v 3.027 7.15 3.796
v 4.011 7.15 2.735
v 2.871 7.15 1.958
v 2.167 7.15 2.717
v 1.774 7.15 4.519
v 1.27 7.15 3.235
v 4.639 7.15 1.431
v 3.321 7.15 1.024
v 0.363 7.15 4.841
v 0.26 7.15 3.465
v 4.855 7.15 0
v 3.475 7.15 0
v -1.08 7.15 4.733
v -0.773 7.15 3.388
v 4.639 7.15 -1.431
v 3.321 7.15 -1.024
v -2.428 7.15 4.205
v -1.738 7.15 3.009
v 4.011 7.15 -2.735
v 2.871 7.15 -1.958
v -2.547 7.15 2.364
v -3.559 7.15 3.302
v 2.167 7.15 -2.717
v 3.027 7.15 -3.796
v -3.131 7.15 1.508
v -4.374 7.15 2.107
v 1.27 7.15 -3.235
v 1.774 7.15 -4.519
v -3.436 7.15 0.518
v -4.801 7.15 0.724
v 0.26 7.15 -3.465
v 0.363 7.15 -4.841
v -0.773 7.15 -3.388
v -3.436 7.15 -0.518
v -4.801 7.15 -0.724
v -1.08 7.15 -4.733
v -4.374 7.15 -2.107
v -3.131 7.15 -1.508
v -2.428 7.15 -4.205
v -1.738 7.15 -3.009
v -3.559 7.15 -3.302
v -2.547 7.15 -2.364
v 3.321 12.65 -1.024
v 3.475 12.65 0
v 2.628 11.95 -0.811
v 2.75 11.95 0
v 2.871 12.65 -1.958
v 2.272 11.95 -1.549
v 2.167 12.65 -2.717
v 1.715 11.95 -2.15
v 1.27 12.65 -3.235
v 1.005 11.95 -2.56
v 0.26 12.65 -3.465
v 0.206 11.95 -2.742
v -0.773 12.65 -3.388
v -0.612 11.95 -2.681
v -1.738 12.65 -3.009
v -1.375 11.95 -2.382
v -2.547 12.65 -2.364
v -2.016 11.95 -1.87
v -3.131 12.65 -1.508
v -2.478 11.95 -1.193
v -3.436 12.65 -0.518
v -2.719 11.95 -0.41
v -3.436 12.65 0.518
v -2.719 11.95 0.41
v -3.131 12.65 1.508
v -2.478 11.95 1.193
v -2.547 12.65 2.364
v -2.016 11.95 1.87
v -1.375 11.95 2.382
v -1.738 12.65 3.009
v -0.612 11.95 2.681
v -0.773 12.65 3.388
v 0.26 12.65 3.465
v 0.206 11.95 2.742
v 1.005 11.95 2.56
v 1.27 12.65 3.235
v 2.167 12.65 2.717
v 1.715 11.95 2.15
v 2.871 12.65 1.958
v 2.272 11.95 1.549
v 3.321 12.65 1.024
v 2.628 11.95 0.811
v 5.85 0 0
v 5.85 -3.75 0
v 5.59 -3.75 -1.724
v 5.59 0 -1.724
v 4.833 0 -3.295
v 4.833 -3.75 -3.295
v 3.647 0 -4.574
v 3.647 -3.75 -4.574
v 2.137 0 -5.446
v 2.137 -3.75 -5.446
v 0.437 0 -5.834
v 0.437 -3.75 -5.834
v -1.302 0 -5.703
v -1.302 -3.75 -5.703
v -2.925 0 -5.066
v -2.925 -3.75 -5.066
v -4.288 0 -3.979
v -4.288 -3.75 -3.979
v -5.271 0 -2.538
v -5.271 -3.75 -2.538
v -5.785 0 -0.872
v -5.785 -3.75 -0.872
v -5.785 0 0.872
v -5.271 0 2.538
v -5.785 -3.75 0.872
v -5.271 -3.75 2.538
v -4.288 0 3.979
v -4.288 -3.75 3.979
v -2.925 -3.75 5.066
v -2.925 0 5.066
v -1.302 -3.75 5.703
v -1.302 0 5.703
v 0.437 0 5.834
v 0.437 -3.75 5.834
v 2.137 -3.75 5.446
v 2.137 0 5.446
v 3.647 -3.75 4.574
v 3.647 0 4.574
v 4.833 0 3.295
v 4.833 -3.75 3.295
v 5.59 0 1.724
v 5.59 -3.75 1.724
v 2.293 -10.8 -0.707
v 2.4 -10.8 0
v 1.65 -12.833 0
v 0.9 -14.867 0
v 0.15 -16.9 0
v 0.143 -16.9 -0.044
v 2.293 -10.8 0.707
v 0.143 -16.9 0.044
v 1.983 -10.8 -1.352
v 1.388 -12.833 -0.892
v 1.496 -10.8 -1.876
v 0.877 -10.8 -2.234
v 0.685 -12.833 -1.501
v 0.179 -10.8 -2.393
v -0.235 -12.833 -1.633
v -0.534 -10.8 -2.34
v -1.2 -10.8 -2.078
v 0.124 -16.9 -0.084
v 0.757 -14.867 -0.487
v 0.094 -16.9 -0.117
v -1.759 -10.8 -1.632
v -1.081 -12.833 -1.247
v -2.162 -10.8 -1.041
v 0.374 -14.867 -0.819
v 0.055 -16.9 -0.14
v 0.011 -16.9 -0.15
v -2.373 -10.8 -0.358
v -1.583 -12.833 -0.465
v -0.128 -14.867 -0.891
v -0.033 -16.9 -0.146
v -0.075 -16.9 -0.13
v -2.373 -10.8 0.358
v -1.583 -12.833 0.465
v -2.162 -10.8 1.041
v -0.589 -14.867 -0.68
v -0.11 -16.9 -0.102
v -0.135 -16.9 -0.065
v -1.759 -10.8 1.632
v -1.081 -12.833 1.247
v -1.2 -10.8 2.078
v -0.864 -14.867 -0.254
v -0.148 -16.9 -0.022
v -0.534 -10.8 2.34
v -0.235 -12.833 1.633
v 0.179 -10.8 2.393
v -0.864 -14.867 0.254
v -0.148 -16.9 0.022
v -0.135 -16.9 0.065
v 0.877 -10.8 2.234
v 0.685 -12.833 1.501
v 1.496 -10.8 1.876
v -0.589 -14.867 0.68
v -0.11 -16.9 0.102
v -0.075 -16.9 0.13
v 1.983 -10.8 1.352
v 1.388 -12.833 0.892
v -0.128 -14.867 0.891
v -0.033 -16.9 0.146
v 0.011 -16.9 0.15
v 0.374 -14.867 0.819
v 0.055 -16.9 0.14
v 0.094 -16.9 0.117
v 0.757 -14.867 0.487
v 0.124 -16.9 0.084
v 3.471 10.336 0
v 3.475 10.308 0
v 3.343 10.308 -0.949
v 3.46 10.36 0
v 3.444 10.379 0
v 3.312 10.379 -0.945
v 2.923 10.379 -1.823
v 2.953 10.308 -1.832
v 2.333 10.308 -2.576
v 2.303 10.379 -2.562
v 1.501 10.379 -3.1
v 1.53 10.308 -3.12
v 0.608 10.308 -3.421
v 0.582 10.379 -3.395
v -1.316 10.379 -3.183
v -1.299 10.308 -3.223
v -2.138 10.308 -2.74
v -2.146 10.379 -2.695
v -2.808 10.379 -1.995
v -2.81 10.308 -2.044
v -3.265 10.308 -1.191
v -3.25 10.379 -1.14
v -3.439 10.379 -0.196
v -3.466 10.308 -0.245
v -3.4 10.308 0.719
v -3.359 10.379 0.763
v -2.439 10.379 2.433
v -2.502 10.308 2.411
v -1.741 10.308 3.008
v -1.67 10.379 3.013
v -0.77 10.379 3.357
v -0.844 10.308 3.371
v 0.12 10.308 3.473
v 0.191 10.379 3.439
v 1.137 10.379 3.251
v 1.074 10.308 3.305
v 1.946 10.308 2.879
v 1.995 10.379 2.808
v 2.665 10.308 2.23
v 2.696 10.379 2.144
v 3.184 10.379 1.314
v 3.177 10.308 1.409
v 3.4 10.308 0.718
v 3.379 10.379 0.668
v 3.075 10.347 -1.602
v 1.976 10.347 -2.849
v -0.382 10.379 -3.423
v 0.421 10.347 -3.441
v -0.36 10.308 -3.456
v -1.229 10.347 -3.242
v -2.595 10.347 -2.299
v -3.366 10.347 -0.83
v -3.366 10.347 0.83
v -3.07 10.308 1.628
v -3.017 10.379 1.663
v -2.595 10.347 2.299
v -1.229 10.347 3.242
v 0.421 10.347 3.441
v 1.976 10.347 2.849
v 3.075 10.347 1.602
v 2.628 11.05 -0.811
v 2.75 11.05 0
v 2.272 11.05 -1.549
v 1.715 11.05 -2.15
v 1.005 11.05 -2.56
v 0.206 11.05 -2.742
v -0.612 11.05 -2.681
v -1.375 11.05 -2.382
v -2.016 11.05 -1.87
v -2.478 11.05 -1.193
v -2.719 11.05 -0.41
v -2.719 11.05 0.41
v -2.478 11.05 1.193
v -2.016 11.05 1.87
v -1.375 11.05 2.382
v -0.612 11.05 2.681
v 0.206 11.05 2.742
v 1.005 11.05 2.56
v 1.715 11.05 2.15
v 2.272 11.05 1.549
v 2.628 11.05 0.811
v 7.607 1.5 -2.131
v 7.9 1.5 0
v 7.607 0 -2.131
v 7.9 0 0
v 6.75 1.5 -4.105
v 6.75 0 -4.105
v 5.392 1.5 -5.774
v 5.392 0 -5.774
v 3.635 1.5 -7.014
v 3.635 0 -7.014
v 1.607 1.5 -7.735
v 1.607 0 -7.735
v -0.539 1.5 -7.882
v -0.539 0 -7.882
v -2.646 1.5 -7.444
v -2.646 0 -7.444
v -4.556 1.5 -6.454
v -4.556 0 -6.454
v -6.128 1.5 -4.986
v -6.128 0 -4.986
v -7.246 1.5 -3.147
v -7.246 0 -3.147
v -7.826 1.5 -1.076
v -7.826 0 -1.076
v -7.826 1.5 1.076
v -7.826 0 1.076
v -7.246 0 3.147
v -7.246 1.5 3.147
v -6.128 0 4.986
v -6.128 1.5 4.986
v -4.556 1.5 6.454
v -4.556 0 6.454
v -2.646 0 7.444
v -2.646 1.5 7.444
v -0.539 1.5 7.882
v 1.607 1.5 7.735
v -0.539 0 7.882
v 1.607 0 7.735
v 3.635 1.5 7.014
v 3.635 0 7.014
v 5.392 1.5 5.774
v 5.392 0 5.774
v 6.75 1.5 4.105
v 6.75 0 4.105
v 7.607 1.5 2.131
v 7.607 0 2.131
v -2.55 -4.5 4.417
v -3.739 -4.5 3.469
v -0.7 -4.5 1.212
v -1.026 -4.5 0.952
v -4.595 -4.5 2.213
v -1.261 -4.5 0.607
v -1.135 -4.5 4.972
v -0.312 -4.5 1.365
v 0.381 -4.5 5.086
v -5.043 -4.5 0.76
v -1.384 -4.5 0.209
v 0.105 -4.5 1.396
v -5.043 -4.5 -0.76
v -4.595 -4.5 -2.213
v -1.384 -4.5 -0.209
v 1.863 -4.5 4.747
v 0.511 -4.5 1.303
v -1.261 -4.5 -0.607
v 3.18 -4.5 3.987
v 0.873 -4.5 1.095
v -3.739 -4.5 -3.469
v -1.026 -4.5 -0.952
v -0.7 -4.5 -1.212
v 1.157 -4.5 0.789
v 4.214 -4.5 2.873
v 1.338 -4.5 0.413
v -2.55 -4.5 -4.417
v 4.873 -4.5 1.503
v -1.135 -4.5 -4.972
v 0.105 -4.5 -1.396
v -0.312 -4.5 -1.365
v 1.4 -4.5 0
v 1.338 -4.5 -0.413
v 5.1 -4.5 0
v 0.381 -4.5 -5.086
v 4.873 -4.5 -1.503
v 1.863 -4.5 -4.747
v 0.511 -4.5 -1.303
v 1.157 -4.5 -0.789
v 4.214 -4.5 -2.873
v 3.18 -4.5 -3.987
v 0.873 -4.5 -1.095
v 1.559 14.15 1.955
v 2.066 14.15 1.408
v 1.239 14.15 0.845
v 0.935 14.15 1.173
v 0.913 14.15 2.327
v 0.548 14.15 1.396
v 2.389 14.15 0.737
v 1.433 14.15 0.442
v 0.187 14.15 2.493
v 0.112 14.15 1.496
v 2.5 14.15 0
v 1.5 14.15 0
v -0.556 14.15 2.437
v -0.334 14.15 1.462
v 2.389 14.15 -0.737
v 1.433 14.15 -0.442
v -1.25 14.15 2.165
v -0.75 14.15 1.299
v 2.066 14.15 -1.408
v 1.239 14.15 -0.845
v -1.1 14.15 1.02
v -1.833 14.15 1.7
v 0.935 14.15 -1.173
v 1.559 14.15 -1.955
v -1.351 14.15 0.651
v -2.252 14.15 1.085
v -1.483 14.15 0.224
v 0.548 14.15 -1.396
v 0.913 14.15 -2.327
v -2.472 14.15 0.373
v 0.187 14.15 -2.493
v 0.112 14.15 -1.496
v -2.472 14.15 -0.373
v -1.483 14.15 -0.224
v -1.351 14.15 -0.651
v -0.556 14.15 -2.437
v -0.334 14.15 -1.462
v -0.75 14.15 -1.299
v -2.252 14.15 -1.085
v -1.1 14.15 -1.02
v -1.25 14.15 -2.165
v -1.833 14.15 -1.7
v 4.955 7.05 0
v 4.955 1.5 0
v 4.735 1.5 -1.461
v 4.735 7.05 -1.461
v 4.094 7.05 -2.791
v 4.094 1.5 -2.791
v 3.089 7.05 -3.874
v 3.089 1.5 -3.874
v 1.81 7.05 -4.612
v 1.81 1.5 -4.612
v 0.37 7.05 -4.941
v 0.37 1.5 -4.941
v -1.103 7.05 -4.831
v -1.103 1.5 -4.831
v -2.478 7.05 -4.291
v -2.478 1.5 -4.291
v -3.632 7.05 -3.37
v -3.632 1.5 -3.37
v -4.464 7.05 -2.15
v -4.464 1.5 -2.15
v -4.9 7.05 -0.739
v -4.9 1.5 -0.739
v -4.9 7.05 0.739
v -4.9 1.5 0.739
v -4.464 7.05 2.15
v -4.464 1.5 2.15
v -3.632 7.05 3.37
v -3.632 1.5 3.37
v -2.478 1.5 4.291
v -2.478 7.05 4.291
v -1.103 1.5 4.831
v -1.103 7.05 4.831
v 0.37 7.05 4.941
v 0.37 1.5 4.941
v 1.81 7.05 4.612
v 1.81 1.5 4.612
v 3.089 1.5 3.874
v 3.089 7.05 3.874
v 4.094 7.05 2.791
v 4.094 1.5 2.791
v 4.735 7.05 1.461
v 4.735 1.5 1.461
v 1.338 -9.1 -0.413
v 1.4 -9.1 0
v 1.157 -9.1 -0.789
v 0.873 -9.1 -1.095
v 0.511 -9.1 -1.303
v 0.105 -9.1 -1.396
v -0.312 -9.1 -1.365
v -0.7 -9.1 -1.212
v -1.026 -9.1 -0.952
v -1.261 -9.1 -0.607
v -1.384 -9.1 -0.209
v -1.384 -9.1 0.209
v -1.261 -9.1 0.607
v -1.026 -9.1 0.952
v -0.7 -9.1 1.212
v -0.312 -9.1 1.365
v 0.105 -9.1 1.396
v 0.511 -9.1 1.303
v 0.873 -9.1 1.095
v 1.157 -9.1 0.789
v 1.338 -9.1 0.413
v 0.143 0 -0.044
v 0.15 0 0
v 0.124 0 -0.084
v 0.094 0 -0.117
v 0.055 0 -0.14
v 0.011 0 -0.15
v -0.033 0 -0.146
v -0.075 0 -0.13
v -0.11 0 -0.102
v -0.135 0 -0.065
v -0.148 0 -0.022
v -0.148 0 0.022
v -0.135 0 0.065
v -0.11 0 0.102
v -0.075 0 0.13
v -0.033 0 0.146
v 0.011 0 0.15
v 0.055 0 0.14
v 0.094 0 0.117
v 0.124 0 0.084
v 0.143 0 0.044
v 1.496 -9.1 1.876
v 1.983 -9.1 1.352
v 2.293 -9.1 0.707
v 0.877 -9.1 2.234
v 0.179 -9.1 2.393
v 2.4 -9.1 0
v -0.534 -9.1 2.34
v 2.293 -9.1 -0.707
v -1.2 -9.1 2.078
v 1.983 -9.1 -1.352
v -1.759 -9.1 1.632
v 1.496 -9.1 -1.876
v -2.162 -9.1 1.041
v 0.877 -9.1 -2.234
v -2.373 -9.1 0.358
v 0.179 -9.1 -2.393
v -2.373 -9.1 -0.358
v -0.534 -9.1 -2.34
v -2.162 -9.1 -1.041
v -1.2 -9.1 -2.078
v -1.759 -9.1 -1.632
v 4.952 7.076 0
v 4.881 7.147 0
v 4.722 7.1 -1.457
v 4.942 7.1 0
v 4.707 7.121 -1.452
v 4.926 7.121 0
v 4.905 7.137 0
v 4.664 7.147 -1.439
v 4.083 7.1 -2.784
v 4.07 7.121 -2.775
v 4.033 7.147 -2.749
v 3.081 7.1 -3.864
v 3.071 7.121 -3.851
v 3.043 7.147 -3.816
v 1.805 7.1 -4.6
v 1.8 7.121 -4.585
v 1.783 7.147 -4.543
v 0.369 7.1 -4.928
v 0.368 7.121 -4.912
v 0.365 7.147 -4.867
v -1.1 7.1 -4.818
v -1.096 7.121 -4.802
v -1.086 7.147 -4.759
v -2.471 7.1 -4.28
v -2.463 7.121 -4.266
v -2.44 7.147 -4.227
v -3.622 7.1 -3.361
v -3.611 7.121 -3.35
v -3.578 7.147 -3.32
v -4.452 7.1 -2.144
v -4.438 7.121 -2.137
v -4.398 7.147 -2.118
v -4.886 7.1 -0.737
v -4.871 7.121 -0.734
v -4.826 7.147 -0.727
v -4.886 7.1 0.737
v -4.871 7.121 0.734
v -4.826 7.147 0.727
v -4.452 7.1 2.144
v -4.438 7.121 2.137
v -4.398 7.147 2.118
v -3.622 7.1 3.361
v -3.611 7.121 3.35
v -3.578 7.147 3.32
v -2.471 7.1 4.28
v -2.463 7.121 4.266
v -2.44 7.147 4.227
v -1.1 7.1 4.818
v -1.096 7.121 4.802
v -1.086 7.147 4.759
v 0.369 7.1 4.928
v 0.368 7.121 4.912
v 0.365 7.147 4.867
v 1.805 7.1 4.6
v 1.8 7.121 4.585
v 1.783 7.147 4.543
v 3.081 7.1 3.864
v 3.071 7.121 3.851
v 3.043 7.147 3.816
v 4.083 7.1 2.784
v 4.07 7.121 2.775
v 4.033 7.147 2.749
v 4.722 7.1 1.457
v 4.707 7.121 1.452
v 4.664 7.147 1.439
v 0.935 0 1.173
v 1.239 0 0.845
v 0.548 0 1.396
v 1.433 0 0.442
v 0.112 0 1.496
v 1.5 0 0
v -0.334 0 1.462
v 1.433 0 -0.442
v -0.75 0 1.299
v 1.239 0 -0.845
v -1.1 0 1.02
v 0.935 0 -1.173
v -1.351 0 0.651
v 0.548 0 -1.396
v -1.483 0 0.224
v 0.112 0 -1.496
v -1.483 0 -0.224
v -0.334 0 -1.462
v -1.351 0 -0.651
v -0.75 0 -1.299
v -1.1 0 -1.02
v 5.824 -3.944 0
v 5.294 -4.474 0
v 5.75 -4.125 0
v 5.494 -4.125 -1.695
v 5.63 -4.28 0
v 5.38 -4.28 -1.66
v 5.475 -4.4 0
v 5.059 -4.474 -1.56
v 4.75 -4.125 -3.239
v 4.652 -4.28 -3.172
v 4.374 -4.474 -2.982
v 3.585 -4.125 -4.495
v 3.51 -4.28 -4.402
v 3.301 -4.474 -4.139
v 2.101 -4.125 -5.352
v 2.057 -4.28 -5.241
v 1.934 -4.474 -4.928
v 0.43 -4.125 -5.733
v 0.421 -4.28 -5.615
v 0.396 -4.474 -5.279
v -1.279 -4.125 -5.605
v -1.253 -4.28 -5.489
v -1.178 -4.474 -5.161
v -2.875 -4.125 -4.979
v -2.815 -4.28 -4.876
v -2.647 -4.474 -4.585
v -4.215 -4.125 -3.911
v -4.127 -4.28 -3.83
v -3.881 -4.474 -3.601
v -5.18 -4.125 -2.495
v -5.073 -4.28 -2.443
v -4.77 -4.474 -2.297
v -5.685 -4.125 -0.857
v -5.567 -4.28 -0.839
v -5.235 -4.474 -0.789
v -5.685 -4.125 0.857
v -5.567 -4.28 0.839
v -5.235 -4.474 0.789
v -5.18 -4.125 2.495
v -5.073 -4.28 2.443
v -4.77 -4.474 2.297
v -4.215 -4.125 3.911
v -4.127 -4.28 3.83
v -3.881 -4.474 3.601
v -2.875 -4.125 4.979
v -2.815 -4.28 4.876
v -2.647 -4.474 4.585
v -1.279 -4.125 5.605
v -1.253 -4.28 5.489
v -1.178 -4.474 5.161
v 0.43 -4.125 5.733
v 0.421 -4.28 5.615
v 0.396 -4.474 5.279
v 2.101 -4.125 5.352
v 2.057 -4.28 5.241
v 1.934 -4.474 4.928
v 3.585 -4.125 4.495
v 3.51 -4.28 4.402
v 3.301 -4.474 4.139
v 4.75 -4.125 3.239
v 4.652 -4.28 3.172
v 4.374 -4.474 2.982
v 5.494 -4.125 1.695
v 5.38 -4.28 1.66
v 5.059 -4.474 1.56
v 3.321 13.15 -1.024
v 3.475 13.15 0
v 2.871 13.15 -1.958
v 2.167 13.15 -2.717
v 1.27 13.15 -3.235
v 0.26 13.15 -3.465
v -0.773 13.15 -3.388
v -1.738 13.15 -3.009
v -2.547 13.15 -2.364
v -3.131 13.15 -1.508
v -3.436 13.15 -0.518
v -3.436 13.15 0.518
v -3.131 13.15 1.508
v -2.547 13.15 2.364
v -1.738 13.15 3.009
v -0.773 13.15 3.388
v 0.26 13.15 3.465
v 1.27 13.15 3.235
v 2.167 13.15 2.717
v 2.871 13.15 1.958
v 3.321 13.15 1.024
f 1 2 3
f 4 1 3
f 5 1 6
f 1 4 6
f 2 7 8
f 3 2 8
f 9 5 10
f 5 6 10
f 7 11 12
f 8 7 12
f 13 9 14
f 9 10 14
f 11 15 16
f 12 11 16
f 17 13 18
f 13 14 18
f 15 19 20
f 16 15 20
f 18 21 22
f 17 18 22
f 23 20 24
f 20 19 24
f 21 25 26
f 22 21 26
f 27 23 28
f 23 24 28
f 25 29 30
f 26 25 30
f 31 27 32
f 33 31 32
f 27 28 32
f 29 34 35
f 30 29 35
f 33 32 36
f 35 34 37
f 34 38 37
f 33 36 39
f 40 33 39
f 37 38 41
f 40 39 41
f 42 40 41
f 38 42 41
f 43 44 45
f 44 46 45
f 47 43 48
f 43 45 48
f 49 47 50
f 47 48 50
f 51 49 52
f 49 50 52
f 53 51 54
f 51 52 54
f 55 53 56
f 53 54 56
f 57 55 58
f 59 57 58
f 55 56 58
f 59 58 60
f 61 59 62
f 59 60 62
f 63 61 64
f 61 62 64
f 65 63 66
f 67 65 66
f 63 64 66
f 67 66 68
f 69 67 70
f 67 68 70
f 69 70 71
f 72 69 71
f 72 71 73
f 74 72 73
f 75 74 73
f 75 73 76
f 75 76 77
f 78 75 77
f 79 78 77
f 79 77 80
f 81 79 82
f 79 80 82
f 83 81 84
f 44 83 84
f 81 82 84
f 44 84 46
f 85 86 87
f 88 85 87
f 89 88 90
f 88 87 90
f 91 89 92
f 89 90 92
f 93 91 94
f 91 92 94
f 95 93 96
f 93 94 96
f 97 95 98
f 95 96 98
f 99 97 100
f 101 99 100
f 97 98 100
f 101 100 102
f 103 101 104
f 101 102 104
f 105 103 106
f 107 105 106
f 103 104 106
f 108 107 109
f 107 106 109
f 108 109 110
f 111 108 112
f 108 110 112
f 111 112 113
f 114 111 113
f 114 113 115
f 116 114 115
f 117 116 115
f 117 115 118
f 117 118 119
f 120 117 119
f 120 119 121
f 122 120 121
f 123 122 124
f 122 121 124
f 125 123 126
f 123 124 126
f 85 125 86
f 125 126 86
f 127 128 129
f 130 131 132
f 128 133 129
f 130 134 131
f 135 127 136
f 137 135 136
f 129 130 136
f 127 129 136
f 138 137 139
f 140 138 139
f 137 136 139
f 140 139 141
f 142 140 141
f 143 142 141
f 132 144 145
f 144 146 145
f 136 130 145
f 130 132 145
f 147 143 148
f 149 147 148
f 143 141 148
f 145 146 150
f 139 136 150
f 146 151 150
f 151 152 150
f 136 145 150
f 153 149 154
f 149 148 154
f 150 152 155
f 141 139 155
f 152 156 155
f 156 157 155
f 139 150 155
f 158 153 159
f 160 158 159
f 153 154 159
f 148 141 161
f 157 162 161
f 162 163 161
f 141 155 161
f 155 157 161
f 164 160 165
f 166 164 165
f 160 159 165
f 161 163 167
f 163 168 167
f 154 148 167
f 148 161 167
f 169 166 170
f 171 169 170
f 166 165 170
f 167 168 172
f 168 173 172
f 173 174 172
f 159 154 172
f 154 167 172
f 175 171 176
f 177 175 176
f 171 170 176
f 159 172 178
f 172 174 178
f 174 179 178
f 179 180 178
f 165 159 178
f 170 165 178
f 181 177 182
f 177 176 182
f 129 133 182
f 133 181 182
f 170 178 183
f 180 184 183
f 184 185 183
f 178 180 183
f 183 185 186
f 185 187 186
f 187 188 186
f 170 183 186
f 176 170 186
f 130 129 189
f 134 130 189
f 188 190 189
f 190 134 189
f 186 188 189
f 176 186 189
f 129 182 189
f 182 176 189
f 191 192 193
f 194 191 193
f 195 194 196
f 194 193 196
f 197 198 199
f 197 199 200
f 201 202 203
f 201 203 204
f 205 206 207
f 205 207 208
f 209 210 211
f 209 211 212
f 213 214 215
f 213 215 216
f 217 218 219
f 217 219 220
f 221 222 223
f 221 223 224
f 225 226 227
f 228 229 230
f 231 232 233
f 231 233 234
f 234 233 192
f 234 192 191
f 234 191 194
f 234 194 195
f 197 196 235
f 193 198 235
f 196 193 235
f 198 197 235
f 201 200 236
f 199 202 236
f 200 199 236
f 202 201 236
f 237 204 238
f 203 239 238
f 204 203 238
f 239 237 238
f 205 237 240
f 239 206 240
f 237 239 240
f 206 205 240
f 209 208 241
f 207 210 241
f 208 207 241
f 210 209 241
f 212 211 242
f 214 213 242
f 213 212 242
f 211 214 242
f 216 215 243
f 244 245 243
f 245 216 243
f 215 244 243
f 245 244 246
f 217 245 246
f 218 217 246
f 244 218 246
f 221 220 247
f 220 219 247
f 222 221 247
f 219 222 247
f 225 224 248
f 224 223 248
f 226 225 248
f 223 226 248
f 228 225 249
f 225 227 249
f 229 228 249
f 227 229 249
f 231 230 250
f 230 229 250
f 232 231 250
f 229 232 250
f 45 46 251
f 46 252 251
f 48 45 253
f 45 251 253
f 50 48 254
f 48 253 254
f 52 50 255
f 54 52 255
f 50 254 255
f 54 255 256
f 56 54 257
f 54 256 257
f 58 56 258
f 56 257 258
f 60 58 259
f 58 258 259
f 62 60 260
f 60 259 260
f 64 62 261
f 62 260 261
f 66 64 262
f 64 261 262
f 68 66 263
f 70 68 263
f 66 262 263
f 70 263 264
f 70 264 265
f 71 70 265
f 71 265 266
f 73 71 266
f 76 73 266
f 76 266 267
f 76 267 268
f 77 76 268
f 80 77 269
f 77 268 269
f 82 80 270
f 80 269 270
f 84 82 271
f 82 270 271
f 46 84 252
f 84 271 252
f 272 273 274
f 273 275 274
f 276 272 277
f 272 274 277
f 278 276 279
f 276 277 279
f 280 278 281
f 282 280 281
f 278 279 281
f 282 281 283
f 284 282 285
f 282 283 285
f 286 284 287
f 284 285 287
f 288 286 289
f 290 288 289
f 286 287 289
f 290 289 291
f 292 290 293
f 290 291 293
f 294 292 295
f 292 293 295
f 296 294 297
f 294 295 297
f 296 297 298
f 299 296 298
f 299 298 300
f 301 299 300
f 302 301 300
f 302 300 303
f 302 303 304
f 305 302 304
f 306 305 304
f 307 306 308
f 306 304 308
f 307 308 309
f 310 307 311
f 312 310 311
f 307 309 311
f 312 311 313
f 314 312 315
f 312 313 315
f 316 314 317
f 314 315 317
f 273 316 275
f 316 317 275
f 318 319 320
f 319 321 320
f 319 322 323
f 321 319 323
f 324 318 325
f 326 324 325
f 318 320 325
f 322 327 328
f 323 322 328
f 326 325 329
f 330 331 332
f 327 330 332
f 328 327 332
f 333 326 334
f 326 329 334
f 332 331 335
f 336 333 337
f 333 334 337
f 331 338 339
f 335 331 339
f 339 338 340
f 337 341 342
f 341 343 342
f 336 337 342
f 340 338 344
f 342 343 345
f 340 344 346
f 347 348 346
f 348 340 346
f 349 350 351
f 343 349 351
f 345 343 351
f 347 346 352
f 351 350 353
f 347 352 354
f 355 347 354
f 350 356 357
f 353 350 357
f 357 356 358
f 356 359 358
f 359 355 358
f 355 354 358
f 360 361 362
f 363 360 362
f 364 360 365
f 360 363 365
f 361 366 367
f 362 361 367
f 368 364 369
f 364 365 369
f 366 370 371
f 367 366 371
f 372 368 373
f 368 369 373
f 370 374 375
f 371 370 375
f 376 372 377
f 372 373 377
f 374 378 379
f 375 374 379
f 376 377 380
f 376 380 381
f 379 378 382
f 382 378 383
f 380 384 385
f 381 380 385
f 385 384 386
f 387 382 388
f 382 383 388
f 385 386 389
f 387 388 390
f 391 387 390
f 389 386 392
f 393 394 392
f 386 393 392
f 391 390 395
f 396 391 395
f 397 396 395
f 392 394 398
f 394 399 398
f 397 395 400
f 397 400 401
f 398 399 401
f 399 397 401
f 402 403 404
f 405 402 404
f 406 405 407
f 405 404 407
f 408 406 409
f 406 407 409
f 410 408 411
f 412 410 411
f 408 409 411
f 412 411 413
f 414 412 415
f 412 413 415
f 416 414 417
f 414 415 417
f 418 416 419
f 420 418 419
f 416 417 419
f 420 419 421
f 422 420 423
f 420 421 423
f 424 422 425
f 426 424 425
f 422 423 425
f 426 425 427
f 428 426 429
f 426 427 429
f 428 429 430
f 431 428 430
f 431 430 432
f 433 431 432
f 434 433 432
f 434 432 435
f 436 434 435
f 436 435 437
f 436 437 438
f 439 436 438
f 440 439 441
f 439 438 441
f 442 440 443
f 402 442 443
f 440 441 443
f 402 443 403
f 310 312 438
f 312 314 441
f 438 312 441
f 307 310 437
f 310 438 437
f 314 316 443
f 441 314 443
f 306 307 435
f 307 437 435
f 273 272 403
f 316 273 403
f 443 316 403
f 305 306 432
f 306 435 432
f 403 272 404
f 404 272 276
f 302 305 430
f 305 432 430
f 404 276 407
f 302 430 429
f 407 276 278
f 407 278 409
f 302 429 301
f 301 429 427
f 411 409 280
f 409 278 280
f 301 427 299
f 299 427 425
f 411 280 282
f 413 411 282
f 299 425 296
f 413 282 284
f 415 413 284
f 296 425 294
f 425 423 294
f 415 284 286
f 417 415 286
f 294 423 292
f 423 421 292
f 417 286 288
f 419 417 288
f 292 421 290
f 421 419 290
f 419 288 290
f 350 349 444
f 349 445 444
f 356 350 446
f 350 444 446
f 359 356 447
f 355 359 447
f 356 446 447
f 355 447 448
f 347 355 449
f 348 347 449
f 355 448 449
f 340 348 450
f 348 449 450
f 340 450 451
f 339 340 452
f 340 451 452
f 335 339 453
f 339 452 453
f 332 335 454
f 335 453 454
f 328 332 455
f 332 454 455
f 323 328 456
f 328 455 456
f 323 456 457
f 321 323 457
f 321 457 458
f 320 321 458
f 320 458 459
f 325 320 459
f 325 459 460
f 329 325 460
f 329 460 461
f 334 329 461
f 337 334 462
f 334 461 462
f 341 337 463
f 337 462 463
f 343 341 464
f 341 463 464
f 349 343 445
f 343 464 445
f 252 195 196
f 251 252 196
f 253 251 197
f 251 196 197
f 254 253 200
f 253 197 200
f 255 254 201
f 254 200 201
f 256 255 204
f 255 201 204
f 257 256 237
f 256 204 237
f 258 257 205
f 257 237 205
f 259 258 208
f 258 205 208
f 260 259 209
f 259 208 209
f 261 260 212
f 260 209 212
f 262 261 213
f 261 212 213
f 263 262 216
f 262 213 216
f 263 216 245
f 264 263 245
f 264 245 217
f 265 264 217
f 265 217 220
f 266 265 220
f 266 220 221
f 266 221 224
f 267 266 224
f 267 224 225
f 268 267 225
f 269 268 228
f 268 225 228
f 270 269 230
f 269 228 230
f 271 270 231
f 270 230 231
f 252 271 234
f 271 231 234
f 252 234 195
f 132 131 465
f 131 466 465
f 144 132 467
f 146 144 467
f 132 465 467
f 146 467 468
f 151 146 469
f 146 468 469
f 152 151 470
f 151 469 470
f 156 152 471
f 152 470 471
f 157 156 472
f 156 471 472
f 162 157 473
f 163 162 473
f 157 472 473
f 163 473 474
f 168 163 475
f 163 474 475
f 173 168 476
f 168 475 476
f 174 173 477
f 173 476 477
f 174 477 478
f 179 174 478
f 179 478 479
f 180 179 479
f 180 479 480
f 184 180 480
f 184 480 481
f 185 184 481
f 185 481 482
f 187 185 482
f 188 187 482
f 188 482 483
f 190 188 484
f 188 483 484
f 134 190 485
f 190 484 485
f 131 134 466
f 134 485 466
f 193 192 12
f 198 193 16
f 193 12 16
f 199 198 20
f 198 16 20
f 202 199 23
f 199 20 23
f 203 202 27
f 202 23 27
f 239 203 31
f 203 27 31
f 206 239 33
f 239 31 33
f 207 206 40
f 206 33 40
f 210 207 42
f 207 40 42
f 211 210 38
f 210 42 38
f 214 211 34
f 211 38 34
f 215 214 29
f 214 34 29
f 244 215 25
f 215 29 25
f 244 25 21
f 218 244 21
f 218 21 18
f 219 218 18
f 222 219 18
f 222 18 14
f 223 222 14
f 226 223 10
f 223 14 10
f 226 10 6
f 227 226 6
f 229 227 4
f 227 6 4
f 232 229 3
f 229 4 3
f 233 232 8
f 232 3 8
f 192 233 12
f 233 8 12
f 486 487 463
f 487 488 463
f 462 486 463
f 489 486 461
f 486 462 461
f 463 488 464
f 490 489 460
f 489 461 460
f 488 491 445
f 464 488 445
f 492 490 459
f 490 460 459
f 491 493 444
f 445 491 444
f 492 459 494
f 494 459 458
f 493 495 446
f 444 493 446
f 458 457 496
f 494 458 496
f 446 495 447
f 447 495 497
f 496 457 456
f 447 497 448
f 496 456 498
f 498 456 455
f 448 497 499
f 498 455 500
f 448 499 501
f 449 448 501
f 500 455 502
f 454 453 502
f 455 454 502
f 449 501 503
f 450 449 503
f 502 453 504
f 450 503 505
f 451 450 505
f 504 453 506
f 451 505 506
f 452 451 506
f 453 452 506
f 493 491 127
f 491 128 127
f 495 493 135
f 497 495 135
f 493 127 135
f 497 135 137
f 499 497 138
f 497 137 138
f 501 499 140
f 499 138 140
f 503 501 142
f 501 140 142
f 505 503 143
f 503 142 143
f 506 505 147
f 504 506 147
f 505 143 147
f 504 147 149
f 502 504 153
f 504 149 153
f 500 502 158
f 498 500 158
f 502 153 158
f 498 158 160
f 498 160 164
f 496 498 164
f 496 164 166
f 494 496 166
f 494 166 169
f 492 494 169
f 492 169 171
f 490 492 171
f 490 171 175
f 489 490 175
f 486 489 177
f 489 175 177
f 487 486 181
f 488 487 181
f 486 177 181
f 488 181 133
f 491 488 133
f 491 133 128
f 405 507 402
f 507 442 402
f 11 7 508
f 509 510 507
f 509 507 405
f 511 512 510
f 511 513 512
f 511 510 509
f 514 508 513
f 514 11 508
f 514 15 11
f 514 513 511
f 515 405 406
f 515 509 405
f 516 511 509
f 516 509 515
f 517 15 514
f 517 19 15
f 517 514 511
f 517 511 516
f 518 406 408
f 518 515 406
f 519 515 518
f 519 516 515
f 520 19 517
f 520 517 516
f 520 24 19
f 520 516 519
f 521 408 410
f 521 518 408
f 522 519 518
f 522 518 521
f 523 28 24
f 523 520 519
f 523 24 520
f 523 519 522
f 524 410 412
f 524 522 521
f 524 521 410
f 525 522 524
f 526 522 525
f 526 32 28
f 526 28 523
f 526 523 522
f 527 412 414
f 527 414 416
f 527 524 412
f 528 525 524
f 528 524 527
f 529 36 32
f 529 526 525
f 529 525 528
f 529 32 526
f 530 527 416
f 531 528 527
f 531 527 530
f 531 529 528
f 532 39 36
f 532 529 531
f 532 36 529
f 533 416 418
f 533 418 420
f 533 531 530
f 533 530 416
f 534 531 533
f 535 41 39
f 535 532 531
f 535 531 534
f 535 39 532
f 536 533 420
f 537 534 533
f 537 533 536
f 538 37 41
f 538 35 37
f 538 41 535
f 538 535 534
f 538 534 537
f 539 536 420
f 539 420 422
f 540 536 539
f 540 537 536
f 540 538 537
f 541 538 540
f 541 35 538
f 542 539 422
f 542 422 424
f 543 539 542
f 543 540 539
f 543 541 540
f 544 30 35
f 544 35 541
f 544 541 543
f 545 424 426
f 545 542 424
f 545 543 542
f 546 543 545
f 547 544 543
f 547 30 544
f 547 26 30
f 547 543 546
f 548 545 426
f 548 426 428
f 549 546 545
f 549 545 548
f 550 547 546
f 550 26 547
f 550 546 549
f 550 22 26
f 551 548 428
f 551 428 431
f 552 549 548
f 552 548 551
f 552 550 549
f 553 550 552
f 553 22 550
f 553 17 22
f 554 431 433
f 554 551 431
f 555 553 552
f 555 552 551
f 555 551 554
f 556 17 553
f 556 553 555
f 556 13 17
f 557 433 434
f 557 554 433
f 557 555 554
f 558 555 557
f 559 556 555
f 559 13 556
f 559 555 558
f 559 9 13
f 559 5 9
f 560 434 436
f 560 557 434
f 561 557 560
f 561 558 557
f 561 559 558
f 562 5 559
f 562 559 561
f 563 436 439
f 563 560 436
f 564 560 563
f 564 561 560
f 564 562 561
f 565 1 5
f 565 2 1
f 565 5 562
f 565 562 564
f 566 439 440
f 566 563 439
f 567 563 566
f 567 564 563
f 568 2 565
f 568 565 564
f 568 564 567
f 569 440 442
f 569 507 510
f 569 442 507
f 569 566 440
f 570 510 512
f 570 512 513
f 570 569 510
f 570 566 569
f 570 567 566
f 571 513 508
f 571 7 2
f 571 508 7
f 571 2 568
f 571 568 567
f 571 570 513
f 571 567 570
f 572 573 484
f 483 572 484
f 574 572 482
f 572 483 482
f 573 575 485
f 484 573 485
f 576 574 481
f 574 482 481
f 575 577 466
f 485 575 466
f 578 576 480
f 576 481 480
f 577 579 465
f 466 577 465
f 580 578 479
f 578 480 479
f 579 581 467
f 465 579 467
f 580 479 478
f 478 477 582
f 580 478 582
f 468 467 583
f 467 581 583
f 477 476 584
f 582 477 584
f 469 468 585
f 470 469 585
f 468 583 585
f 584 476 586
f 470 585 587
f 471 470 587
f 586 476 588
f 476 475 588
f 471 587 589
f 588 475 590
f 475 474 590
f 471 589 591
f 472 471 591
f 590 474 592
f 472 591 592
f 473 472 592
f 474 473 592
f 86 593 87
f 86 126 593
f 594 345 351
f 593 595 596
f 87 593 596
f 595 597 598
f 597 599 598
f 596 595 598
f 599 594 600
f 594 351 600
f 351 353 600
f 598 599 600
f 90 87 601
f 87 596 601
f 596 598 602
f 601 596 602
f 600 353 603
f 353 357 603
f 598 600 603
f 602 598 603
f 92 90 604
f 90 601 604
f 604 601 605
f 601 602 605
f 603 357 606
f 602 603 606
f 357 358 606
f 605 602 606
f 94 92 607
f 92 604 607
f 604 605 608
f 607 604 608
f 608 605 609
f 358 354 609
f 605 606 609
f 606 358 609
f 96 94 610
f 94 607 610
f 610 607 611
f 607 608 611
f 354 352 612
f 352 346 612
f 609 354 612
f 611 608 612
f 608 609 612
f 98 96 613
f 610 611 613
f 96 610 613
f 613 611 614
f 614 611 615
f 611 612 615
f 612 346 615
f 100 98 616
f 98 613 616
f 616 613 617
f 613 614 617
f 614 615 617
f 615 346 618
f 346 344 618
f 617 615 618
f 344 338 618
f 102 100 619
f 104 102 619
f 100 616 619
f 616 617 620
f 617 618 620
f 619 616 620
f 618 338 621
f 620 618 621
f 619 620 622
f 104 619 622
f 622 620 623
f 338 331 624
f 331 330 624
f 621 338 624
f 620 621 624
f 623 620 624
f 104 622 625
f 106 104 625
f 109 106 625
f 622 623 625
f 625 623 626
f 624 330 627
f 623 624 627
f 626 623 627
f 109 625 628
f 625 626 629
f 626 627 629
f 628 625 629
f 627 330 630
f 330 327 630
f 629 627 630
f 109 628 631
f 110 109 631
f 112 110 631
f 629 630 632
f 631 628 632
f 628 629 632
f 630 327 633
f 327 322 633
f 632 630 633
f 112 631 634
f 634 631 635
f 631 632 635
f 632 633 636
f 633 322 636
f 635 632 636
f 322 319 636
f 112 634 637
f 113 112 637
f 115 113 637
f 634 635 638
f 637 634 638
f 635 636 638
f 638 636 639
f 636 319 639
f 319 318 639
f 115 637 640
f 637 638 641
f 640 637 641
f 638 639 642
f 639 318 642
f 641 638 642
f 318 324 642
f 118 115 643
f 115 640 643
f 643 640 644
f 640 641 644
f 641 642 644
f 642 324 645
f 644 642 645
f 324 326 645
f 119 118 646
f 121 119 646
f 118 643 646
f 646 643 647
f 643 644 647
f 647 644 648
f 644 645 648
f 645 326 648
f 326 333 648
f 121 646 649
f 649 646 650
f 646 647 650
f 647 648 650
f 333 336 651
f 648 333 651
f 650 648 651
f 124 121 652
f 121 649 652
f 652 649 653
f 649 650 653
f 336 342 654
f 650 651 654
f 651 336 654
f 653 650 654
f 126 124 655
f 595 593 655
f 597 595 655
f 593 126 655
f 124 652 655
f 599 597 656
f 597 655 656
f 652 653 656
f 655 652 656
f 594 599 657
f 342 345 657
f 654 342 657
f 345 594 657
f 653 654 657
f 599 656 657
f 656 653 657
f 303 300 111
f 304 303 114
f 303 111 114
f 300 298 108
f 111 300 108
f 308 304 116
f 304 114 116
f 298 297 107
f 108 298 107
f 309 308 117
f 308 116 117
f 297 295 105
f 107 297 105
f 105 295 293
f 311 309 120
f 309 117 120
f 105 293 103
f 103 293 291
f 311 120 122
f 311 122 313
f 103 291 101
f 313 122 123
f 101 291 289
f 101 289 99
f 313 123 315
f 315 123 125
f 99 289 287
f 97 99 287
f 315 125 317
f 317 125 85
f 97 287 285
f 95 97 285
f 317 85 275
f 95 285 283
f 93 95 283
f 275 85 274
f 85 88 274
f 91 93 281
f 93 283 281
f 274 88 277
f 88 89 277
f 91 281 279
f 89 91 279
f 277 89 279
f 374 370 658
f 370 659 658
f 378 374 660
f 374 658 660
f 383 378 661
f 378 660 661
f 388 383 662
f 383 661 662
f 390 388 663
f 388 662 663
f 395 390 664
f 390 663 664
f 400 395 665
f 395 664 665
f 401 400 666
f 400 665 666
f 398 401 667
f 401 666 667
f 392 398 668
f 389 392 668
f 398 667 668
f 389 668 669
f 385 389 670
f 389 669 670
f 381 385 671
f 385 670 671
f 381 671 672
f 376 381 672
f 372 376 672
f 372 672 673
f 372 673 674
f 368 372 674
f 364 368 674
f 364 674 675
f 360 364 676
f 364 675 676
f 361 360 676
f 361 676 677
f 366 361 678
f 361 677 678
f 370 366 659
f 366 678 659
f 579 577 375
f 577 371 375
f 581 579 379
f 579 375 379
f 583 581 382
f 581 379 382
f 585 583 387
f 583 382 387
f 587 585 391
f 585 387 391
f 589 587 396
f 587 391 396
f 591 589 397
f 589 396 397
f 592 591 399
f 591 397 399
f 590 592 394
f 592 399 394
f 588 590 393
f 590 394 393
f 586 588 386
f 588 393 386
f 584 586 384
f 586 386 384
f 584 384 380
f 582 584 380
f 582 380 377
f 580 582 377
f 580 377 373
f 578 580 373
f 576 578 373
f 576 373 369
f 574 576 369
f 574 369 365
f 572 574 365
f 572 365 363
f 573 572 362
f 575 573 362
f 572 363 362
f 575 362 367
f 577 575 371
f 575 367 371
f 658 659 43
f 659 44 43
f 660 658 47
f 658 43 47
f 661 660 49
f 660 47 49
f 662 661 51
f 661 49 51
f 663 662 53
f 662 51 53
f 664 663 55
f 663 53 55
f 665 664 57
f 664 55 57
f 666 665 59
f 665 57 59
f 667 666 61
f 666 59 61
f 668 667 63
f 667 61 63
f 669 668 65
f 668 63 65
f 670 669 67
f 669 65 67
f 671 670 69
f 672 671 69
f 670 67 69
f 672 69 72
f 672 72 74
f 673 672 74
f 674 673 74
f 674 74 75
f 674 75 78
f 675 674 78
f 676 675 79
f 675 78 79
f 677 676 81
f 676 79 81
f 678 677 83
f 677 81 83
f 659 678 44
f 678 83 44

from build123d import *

# Parameters (mm, degrees)
FILLET1_R = 0.75
FILLET2_R = 0.1


with BuildPart() as part:
    # Sketch1 → Revolve1 (revolve)
    with BuildSketch(Plane.XY):
        Polygon((1.5, 14.15), (2.5, 14.15), (3.475, 13.15), (3.475, 12.65), (2.75, 11.95), (2.75, 11.05), (3.475, 10.35), (3.475, 7.15), (4.955, 7.15), (4.955, 1.5), (7.9, 1.5), (7.9, 0), (5.85, 0), (5.85, -4.5), (1.4, -4.5), (1.4, -9.1), (2.4, -9.1), (2.4, -10.8), (0.15, -16.9), (0.15, 0), (1.5, 0), align=None)
    revolve(axis=Axis((0, 0, 0), (0, 1, 0)))

    # Fillet1
    fillet1_edges = [part.edges().sort_by_distance(p)[0] for p in [
        (-5.85, -4.5, 0),
    ]]
    fillet(fillet1_edges, radius=FILLET1_R)

    # Fillet2
    fillet2_edges = [part.edges().sort_by_distance(p)[0] for p in [
        (-4.955, 7.15, 0),
        (-3.475, 10.35, 0),
    ]]
    fillet(fillet2_edges, radius=FILLET2_R)


solid = part.part
